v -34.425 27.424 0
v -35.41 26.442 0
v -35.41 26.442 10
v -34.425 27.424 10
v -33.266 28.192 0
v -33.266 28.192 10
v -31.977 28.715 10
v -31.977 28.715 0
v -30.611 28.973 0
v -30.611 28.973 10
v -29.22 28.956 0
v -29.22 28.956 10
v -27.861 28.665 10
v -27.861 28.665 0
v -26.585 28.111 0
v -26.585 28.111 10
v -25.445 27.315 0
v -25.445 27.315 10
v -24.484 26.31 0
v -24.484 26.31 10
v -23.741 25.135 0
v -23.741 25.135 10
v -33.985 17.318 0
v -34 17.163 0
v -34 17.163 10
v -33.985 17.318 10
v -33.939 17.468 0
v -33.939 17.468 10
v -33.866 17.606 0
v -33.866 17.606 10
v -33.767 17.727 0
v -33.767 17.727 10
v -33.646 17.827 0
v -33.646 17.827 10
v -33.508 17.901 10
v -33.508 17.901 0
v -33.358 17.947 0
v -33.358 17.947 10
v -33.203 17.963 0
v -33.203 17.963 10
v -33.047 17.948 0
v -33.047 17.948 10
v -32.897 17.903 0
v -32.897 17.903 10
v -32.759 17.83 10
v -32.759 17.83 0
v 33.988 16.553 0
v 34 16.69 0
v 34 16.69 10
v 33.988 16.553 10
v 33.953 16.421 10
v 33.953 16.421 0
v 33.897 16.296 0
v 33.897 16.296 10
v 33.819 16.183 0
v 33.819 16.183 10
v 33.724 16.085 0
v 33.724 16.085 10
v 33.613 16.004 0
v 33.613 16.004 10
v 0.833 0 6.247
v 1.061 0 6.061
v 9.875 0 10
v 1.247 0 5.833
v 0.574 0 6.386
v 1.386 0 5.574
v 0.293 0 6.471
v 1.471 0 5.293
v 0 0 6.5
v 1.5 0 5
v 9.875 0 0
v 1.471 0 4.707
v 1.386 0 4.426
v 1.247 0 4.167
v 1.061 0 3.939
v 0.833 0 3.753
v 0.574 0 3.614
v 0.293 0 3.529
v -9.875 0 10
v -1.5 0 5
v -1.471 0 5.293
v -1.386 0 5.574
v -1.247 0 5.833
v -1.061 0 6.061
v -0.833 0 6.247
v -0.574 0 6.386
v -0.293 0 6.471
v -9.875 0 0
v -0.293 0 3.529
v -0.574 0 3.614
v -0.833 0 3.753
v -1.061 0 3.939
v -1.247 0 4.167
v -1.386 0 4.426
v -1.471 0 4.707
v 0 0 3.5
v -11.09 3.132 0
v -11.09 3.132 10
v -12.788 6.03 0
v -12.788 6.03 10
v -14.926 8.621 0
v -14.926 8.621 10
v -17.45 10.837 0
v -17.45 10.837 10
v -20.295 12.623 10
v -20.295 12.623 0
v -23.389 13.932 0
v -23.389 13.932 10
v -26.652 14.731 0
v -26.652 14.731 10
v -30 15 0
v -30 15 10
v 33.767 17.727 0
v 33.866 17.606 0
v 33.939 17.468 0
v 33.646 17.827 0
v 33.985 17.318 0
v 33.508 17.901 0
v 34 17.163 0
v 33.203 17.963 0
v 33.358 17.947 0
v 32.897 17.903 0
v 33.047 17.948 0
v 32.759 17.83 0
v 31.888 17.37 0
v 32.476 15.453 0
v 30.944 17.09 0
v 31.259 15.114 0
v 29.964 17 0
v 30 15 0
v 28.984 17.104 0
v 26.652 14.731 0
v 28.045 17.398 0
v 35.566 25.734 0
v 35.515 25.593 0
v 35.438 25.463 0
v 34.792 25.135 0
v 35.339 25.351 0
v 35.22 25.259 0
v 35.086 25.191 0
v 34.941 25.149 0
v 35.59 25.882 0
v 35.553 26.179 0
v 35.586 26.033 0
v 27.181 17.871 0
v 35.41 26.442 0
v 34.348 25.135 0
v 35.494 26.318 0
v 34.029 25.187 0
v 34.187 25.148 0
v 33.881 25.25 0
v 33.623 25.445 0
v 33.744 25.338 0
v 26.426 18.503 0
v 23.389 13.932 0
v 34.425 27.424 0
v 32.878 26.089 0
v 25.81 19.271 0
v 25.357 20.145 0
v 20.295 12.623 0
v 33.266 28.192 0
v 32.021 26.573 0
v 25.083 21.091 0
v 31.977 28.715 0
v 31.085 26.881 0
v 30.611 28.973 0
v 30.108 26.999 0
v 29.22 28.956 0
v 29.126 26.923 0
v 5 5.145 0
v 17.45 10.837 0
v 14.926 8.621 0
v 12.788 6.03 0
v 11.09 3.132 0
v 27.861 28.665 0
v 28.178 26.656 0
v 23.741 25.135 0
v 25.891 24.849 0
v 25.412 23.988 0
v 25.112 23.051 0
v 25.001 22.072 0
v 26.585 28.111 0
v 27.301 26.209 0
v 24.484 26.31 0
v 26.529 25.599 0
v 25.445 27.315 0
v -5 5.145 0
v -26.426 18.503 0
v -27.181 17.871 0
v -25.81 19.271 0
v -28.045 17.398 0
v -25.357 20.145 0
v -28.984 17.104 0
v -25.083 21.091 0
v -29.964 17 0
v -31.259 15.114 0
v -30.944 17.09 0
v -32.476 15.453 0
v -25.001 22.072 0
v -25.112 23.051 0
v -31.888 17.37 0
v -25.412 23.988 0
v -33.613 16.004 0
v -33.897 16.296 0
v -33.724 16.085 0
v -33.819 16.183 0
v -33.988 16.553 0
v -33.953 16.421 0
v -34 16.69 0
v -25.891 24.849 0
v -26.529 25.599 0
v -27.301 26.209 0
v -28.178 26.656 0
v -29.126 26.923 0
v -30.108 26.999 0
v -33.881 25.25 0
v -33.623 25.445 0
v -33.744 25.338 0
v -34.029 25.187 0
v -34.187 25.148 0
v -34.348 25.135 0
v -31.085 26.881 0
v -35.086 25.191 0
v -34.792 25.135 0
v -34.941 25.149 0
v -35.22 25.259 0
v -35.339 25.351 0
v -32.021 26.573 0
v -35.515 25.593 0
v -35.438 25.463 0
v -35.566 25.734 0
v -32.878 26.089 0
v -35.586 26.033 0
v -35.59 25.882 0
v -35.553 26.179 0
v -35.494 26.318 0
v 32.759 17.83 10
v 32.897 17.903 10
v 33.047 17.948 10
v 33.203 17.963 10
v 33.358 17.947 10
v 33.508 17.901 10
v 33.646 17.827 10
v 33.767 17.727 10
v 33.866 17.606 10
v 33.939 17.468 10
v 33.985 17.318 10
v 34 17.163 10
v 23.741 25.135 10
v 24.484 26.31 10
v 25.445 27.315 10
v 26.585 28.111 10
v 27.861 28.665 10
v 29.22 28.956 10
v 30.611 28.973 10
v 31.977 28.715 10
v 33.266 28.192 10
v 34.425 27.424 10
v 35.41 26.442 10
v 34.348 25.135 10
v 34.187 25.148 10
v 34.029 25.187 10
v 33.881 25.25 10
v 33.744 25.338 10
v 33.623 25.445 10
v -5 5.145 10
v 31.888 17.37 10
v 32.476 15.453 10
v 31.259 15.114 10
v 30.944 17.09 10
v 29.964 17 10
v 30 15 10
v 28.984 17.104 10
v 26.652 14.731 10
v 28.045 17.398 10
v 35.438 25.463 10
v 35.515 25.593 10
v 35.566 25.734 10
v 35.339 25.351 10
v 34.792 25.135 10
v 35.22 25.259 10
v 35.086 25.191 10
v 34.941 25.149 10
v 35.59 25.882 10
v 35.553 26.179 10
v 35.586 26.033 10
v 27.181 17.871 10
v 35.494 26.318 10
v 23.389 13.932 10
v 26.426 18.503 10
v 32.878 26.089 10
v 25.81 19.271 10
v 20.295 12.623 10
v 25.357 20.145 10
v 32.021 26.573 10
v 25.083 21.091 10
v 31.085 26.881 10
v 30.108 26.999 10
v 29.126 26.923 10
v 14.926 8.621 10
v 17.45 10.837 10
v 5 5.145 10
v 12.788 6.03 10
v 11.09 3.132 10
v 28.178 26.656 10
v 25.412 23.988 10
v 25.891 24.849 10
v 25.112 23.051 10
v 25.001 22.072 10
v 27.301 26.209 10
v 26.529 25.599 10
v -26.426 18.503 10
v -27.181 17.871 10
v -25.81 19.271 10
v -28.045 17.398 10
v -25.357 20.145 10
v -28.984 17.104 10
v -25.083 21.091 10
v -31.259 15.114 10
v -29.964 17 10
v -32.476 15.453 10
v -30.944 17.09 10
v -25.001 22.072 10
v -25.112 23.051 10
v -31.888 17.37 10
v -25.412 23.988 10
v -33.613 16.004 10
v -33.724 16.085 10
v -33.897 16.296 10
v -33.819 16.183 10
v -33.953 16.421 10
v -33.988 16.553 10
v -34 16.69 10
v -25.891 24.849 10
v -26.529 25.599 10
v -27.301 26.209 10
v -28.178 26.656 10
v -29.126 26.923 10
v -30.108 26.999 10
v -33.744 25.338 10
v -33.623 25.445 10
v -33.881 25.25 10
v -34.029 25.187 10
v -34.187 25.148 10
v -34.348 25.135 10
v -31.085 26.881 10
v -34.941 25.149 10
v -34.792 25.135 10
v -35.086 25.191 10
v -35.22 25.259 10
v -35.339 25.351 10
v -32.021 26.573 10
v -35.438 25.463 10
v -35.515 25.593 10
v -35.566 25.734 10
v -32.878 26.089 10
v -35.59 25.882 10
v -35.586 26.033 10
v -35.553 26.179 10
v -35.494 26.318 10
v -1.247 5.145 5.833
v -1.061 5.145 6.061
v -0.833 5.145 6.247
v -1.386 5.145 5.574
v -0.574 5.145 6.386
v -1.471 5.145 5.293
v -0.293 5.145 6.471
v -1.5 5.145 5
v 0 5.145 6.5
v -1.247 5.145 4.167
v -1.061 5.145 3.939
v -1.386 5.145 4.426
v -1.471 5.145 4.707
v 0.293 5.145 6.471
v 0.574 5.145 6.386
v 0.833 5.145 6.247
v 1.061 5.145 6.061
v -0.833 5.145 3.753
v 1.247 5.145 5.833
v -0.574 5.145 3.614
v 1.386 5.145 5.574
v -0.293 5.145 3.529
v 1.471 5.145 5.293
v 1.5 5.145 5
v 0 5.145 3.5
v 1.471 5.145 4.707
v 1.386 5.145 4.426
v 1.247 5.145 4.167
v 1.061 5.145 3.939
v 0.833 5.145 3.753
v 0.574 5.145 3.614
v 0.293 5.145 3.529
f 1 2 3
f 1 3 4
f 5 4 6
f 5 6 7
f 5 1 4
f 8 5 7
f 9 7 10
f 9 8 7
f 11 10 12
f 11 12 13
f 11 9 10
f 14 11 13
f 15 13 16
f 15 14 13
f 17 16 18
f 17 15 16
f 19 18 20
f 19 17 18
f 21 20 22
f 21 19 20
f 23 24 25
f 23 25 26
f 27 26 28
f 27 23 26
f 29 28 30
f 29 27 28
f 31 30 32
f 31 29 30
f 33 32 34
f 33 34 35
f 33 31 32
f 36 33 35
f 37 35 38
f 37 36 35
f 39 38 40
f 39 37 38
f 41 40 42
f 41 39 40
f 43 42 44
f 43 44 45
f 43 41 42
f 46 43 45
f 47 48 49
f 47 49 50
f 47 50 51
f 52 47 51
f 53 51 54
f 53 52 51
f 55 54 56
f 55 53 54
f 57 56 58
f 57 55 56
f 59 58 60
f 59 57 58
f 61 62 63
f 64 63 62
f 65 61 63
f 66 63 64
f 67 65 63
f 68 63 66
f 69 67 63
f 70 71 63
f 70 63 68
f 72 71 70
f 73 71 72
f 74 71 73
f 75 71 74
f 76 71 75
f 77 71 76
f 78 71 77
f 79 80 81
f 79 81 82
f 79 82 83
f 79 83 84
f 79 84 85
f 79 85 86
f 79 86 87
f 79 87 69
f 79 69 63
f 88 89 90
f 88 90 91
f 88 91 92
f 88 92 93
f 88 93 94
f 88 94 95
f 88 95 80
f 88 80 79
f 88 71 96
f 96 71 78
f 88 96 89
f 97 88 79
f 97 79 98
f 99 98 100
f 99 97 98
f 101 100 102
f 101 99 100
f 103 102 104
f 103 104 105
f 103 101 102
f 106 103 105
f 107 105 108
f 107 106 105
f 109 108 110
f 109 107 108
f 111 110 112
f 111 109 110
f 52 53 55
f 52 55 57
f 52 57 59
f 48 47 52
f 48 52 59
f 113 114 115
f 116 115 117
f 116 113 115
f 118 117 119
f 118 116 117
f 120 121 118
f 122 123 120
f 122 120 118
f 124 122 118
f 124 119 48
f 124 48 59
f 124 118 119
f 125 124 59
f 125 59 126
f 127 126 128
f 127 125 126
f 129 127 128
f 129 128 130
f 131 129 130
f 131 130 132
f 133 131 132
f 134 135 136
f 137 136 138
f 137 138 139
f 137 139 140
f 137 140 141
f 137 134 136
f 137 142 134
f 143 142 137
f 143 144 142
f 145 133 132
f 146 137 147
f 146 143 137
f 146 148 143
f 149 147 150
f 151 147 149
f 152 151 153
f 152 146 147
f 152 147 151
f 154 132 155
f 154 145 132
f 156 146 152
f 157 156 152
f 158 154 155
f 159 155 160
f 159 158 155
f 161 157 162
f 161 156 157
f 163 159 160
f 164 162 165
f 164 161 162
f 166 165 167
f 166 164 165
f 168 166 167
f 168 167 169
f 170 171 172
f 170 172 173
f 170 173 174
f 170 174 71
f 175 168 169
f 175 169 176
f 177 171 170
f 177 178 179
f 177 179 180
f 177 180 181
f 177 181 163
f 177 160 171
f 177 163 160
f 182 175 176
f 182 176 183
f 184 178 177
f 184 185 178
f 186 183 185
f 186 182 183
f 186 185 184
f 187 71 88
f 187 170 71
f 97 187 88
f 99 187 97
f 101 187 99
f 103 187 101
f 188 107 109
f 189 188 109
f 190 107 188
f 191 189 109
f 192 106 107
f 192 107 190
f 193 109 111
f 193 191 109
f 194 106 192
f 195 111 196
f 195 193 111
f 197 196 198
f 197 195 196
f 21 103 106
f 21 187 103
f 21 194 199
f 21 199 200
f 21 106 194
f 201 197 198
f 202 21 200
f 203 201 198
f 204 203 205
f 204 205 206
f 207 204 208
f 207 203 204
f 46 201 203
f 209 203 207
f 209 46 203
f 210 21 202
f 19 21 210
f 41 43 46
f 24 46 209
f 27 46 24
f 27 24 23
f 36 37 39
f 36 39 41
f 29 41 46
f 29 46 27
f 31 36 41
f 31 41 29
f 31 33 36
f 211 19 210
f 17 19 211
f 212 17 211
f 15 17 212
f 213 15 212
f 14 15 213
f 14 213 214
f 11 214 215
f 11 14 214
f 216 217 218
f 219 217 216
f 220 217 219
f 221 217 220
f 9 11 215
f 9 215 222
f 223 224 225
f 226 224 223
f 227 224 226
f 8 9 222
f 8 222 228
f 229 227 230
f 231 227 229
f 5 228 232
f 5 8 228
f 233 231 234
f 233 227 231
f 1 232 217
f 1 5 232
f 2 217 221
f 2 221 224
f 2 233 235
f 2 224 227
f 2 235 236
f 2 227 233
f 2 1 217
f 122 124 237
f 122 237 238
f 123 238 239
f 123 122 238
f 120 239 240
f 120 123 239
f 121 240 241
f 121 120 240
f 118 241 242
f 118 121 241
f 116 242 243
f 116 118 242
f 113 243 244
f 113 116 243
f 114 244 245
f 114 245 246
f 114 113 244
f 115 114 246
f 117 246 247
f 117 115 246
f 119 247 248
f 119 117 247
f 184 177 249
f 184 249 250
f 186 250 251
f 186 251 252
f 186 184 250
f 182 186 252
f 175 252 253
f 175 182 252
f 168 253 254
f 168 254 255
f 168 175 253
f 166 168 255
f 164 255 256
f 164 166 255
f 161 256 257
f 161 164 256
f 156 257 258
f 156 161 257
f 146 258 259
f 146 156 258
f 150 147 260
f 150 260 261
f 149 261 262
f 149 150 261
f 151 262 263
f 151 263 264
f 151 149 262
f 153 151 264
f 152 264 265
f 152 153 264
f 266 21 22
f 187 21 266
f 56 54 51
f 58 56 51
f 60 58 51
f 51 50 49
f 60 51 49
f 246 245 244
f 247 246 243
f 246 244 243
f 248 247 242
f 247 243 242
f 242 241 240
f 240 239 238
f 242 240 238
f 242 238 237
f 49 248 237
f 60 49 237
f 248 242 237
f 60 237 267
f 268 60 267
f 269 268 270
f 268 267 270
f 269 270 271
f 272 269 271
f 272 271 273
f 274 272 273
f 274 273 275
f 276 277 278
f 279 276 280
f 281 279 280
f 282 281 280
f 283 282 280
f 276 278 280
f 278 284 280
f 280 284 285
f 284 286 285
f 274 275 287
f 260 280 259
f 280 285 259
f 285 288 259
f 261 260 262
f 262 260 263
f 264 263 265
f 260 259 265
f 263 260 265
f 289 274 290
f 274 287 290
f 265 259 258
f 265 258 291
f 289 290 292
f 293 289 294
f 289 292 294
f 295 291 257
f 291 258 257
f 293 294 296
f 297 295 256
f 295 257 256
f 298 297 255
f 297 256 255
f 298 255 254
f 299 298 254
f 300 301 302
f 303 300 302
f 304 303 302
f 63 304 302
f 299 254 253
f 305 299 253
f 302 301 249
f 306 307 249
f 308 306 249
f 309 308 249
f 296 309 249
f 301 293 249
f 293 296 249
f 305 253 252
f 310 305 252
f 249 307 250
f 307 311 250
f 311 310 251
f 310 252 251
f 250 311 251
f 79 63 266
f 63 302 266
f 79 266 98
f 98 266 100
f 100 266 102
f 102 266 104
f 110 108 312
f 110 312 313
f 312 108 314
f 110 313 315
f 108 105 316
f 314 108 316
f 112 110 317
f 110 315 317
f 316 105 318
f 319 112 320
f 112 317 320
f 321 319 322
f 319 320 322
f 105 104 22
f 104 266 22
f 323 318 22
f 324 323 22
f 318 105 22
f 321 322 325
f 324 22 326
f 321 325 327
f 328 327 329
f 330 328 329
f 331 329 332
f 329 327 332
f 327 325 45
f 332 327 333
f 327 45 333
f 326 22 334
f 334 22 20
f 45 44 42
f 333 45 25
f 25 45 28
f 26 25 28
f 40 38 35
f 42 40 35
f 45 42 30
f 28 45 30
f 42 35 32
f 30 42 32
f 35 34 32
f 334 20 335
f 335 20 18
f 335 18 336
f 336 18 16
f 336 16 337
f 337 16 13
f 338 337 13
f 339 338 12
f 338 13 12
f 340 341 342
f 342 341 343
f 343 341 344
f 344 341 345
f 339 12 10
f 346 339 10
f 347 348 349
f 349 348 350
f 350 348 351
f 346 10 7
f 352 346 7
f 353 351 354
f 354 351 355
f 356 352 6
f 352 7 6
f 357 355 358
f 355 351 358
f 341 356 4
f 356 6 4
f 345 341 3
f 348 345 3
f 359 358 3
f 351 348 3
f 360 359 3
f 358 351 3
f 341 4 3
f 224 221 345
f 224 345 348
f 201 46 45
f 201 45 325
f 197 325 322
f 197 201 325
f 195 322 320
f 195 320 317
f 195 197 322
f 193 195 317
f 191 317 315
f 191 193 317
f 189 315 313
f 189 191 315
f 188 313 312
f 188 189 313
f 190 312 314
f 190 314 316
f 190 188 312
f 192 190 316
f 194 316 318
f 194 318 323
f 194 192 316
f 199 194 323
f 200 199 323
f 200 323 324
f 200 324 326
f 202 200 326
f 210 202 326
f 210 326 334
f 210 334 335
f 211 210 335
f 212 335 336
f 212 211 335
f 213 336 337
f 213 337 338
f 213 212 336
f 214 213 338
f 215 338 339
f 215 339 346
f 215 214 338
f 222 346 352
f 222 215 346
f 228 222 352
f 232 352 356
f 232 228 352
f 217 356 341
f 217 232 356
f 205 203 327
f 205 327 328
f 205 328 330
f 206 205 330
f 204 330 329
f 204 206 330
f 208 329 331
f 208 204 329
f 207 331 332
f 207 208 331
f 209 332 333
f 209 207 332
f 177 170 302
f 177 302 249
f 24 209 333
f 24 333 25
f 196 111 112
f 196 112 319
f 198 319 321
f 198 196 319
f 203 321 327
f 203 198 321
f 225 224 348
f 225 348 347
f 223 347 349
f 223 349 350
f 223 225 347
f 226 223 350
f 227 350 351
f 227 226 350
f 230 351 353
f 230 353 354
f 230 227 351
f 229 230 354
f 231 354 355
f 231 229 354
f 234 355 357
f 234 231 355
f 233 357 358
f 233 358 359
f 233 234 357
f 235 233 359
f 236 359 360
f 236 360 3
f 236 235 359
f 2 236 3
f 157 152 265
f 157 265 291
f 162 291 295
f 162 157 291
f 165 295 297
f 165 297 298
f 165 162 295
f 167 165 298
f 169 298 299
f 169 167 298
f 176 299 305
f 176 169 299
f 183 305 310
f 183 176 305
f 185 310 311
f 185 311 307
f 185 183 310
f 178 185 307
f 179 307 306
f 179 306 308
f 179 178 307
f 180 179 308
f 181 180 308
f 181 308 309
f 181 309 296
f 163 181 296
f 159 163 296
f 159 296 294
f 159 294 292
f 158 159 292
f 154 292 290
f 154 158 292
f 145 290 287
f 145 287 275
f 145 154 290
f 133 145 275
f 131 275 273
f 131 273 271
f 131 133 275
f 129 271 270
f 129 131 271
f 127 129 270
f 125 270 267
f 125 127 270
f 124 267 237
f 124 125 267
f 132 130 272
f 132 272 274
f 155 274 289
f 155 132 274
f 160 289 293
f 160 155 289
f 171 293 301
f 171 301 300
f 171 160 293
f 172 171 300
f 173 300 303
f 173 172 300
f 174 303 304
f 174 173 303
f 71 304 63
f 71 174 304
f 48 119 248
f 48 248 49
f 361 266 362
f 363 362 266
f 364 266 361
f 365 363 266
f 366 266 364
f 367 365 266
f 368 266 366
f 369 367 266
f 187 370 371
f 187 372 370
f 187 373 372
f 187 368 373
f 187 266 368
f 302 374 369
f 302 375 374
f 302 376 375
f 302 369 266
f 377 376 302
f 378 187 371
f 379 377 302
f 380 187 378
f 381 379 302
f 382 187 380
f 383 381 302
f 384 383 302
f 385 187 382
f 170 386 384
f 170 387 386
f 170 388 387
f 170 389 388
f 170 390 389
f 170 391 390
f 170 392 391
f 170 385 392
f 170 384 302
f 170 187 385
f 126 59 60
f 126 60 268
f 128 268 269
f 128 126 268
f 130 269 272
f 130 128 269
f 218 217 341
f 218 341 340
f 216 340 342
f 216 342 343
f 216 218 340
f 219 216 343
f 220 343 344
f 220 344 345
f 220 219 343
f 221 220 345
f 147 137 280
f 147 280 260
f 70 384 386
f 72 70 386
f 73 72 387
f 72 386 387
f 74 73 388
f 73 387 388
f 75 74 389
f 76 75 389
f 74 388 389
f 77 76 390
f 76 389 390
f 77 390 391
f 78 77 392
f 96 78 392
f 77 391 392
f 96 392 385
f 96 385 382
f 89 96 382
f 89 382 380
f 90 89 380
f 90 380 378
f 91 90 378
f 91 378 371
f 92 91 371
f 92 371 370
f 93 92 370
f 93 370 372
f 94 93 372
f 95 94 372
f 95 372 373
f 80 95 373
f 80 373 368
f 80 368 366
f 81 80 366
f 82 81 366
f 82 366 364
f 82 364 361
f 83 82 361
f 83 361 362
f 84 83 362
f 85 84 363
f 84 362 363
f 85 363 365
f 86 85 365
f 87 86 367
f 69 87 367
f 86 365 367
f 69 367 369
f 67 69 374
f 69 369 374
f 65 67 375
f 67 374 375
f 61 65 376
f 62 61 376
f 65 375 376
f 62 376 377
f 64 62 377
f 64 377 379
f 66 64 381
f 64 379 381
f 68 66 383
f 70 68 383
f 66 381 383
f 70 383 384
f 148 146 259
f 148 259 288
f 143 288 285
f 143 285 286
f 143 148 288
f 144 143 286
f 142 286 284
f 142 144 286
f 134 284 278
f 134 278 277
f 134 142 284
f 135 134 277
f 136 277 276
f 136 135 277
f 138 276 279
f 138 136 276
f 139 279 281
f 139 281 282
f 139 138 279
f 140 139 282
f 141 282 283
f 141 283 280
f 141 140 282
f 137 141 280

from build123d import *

# Parameters (mm, degrees)
BOSS_EXTRUDE1_DEPTH = 10
SKETCH2_R           = 1.5
CUT_EXTRUDE1_DEPTH  = 10


with BuildPart() as part:
    # Sketch1 → Boss-Extrude1 (new body)
    with BuildSketch(Plane.XY):
        with BuildLine():
            Line((9.875388203, 0), (-9.875388203, 0))
            ThreePointArc((-9.875388203, 0), (-17.450099602, 10.83745824), (-30, 15))
            ThreePointArc((-30, 15), (-31.8749625, 15.255779094), (-33.612903226, 16.004424108))
            ThreePointArc((-33.612903226, 16.004424108), (-33.896535204, 16.29613728), (-34, 16.689632781))
            Line((-34, 16.689632781), (-34, 17.162645351))
            ThreePointArc((-34, 17.162645351), (-33.578745661, 17.867309614), (-32.75862069, 17.829866682))
            ThreePointArc((-32.75862069, 17.829866682), (-25.031925557, 22.564124391), (-33.623370468, 25.445458816))
            ThreePointArc((-33.623370468, 25.445458816), (-33.953767859, 25.215558804), (-34.348044562, 25.134550579))
            Line((-34.348044562, 25.134550579), (-34.791587602, 25.134550579))
            ThreePointArc((-34.791587602, 25.134550579), (-35.51482586, 25.592605522), (-35.409856969, 26.442234524))
            ThreePointArc((-35.409856969, 26.442234524), (-29.220414383, 28.95645357), (-23.74103901, 25.134550579))
            Line((-23.74103901, 25.134550579), (-5, 5.145359938))
            Line((-5, 5.145359938), (5, 5.145359938))
            Line((5, 5.145359938), (23.74103901, 25.134550579))
            ThreePointArc((23.74103901, 25.134550579), (29.220414383, 28.95645357), (35.409856969, 26.442234524))
            ThreePointArc((35.409856969, 26.442234524), (35.51482586, 25.592605522), (34.791587602, 25.134550579))
            Line((34.791587602, 25.134550579), (34.348044562, 25.134550579))
            ThreePointArc((34.348044562, 25.134550579), (33.953767859, 25.215558804), (33.623370468, 25.445458816))
            ThreePointArc((33.623370468, 25.445458816), (25.031925557, 22.564124391), (32.75862069, 17.829866682))
            ThreePointArc((32.75862069, 17.829866682), (33.578745661, 17.867309614), (34, 17.162645351))
            Line((34, 17.162645351), (34, 16.689632781))
            ThreePointArc((34, 16.689632781), (33.896535204, 16.29613728), (33.612903226, 16.004424108))
            ThreePointArc((33.612903226, 16.004424108), (31.8749625, 15.255779094), (30, 15))
            ThreePointArc((30, 15), (17.450099602, 10.83745824), (9.875388203, 0))
        make_face()
    extrude(amount=BOSS_EXTRUDE1_DEPTH)

    # Sketch2 → Cut-Extrude1 (cut)
    with BuildSketch(Plane(origin=(0, 5.145359938, 0), x_dir=(1, 0, 0), z_dir=(0, 1, 0))):
        with Locations((0, -5)):
            Circle(SKETCH2_R)
    extrude(amount=-CUT_EXTRUDE1_DEPTH, mode=Mode.SUBTRACT)


solid = part.part
